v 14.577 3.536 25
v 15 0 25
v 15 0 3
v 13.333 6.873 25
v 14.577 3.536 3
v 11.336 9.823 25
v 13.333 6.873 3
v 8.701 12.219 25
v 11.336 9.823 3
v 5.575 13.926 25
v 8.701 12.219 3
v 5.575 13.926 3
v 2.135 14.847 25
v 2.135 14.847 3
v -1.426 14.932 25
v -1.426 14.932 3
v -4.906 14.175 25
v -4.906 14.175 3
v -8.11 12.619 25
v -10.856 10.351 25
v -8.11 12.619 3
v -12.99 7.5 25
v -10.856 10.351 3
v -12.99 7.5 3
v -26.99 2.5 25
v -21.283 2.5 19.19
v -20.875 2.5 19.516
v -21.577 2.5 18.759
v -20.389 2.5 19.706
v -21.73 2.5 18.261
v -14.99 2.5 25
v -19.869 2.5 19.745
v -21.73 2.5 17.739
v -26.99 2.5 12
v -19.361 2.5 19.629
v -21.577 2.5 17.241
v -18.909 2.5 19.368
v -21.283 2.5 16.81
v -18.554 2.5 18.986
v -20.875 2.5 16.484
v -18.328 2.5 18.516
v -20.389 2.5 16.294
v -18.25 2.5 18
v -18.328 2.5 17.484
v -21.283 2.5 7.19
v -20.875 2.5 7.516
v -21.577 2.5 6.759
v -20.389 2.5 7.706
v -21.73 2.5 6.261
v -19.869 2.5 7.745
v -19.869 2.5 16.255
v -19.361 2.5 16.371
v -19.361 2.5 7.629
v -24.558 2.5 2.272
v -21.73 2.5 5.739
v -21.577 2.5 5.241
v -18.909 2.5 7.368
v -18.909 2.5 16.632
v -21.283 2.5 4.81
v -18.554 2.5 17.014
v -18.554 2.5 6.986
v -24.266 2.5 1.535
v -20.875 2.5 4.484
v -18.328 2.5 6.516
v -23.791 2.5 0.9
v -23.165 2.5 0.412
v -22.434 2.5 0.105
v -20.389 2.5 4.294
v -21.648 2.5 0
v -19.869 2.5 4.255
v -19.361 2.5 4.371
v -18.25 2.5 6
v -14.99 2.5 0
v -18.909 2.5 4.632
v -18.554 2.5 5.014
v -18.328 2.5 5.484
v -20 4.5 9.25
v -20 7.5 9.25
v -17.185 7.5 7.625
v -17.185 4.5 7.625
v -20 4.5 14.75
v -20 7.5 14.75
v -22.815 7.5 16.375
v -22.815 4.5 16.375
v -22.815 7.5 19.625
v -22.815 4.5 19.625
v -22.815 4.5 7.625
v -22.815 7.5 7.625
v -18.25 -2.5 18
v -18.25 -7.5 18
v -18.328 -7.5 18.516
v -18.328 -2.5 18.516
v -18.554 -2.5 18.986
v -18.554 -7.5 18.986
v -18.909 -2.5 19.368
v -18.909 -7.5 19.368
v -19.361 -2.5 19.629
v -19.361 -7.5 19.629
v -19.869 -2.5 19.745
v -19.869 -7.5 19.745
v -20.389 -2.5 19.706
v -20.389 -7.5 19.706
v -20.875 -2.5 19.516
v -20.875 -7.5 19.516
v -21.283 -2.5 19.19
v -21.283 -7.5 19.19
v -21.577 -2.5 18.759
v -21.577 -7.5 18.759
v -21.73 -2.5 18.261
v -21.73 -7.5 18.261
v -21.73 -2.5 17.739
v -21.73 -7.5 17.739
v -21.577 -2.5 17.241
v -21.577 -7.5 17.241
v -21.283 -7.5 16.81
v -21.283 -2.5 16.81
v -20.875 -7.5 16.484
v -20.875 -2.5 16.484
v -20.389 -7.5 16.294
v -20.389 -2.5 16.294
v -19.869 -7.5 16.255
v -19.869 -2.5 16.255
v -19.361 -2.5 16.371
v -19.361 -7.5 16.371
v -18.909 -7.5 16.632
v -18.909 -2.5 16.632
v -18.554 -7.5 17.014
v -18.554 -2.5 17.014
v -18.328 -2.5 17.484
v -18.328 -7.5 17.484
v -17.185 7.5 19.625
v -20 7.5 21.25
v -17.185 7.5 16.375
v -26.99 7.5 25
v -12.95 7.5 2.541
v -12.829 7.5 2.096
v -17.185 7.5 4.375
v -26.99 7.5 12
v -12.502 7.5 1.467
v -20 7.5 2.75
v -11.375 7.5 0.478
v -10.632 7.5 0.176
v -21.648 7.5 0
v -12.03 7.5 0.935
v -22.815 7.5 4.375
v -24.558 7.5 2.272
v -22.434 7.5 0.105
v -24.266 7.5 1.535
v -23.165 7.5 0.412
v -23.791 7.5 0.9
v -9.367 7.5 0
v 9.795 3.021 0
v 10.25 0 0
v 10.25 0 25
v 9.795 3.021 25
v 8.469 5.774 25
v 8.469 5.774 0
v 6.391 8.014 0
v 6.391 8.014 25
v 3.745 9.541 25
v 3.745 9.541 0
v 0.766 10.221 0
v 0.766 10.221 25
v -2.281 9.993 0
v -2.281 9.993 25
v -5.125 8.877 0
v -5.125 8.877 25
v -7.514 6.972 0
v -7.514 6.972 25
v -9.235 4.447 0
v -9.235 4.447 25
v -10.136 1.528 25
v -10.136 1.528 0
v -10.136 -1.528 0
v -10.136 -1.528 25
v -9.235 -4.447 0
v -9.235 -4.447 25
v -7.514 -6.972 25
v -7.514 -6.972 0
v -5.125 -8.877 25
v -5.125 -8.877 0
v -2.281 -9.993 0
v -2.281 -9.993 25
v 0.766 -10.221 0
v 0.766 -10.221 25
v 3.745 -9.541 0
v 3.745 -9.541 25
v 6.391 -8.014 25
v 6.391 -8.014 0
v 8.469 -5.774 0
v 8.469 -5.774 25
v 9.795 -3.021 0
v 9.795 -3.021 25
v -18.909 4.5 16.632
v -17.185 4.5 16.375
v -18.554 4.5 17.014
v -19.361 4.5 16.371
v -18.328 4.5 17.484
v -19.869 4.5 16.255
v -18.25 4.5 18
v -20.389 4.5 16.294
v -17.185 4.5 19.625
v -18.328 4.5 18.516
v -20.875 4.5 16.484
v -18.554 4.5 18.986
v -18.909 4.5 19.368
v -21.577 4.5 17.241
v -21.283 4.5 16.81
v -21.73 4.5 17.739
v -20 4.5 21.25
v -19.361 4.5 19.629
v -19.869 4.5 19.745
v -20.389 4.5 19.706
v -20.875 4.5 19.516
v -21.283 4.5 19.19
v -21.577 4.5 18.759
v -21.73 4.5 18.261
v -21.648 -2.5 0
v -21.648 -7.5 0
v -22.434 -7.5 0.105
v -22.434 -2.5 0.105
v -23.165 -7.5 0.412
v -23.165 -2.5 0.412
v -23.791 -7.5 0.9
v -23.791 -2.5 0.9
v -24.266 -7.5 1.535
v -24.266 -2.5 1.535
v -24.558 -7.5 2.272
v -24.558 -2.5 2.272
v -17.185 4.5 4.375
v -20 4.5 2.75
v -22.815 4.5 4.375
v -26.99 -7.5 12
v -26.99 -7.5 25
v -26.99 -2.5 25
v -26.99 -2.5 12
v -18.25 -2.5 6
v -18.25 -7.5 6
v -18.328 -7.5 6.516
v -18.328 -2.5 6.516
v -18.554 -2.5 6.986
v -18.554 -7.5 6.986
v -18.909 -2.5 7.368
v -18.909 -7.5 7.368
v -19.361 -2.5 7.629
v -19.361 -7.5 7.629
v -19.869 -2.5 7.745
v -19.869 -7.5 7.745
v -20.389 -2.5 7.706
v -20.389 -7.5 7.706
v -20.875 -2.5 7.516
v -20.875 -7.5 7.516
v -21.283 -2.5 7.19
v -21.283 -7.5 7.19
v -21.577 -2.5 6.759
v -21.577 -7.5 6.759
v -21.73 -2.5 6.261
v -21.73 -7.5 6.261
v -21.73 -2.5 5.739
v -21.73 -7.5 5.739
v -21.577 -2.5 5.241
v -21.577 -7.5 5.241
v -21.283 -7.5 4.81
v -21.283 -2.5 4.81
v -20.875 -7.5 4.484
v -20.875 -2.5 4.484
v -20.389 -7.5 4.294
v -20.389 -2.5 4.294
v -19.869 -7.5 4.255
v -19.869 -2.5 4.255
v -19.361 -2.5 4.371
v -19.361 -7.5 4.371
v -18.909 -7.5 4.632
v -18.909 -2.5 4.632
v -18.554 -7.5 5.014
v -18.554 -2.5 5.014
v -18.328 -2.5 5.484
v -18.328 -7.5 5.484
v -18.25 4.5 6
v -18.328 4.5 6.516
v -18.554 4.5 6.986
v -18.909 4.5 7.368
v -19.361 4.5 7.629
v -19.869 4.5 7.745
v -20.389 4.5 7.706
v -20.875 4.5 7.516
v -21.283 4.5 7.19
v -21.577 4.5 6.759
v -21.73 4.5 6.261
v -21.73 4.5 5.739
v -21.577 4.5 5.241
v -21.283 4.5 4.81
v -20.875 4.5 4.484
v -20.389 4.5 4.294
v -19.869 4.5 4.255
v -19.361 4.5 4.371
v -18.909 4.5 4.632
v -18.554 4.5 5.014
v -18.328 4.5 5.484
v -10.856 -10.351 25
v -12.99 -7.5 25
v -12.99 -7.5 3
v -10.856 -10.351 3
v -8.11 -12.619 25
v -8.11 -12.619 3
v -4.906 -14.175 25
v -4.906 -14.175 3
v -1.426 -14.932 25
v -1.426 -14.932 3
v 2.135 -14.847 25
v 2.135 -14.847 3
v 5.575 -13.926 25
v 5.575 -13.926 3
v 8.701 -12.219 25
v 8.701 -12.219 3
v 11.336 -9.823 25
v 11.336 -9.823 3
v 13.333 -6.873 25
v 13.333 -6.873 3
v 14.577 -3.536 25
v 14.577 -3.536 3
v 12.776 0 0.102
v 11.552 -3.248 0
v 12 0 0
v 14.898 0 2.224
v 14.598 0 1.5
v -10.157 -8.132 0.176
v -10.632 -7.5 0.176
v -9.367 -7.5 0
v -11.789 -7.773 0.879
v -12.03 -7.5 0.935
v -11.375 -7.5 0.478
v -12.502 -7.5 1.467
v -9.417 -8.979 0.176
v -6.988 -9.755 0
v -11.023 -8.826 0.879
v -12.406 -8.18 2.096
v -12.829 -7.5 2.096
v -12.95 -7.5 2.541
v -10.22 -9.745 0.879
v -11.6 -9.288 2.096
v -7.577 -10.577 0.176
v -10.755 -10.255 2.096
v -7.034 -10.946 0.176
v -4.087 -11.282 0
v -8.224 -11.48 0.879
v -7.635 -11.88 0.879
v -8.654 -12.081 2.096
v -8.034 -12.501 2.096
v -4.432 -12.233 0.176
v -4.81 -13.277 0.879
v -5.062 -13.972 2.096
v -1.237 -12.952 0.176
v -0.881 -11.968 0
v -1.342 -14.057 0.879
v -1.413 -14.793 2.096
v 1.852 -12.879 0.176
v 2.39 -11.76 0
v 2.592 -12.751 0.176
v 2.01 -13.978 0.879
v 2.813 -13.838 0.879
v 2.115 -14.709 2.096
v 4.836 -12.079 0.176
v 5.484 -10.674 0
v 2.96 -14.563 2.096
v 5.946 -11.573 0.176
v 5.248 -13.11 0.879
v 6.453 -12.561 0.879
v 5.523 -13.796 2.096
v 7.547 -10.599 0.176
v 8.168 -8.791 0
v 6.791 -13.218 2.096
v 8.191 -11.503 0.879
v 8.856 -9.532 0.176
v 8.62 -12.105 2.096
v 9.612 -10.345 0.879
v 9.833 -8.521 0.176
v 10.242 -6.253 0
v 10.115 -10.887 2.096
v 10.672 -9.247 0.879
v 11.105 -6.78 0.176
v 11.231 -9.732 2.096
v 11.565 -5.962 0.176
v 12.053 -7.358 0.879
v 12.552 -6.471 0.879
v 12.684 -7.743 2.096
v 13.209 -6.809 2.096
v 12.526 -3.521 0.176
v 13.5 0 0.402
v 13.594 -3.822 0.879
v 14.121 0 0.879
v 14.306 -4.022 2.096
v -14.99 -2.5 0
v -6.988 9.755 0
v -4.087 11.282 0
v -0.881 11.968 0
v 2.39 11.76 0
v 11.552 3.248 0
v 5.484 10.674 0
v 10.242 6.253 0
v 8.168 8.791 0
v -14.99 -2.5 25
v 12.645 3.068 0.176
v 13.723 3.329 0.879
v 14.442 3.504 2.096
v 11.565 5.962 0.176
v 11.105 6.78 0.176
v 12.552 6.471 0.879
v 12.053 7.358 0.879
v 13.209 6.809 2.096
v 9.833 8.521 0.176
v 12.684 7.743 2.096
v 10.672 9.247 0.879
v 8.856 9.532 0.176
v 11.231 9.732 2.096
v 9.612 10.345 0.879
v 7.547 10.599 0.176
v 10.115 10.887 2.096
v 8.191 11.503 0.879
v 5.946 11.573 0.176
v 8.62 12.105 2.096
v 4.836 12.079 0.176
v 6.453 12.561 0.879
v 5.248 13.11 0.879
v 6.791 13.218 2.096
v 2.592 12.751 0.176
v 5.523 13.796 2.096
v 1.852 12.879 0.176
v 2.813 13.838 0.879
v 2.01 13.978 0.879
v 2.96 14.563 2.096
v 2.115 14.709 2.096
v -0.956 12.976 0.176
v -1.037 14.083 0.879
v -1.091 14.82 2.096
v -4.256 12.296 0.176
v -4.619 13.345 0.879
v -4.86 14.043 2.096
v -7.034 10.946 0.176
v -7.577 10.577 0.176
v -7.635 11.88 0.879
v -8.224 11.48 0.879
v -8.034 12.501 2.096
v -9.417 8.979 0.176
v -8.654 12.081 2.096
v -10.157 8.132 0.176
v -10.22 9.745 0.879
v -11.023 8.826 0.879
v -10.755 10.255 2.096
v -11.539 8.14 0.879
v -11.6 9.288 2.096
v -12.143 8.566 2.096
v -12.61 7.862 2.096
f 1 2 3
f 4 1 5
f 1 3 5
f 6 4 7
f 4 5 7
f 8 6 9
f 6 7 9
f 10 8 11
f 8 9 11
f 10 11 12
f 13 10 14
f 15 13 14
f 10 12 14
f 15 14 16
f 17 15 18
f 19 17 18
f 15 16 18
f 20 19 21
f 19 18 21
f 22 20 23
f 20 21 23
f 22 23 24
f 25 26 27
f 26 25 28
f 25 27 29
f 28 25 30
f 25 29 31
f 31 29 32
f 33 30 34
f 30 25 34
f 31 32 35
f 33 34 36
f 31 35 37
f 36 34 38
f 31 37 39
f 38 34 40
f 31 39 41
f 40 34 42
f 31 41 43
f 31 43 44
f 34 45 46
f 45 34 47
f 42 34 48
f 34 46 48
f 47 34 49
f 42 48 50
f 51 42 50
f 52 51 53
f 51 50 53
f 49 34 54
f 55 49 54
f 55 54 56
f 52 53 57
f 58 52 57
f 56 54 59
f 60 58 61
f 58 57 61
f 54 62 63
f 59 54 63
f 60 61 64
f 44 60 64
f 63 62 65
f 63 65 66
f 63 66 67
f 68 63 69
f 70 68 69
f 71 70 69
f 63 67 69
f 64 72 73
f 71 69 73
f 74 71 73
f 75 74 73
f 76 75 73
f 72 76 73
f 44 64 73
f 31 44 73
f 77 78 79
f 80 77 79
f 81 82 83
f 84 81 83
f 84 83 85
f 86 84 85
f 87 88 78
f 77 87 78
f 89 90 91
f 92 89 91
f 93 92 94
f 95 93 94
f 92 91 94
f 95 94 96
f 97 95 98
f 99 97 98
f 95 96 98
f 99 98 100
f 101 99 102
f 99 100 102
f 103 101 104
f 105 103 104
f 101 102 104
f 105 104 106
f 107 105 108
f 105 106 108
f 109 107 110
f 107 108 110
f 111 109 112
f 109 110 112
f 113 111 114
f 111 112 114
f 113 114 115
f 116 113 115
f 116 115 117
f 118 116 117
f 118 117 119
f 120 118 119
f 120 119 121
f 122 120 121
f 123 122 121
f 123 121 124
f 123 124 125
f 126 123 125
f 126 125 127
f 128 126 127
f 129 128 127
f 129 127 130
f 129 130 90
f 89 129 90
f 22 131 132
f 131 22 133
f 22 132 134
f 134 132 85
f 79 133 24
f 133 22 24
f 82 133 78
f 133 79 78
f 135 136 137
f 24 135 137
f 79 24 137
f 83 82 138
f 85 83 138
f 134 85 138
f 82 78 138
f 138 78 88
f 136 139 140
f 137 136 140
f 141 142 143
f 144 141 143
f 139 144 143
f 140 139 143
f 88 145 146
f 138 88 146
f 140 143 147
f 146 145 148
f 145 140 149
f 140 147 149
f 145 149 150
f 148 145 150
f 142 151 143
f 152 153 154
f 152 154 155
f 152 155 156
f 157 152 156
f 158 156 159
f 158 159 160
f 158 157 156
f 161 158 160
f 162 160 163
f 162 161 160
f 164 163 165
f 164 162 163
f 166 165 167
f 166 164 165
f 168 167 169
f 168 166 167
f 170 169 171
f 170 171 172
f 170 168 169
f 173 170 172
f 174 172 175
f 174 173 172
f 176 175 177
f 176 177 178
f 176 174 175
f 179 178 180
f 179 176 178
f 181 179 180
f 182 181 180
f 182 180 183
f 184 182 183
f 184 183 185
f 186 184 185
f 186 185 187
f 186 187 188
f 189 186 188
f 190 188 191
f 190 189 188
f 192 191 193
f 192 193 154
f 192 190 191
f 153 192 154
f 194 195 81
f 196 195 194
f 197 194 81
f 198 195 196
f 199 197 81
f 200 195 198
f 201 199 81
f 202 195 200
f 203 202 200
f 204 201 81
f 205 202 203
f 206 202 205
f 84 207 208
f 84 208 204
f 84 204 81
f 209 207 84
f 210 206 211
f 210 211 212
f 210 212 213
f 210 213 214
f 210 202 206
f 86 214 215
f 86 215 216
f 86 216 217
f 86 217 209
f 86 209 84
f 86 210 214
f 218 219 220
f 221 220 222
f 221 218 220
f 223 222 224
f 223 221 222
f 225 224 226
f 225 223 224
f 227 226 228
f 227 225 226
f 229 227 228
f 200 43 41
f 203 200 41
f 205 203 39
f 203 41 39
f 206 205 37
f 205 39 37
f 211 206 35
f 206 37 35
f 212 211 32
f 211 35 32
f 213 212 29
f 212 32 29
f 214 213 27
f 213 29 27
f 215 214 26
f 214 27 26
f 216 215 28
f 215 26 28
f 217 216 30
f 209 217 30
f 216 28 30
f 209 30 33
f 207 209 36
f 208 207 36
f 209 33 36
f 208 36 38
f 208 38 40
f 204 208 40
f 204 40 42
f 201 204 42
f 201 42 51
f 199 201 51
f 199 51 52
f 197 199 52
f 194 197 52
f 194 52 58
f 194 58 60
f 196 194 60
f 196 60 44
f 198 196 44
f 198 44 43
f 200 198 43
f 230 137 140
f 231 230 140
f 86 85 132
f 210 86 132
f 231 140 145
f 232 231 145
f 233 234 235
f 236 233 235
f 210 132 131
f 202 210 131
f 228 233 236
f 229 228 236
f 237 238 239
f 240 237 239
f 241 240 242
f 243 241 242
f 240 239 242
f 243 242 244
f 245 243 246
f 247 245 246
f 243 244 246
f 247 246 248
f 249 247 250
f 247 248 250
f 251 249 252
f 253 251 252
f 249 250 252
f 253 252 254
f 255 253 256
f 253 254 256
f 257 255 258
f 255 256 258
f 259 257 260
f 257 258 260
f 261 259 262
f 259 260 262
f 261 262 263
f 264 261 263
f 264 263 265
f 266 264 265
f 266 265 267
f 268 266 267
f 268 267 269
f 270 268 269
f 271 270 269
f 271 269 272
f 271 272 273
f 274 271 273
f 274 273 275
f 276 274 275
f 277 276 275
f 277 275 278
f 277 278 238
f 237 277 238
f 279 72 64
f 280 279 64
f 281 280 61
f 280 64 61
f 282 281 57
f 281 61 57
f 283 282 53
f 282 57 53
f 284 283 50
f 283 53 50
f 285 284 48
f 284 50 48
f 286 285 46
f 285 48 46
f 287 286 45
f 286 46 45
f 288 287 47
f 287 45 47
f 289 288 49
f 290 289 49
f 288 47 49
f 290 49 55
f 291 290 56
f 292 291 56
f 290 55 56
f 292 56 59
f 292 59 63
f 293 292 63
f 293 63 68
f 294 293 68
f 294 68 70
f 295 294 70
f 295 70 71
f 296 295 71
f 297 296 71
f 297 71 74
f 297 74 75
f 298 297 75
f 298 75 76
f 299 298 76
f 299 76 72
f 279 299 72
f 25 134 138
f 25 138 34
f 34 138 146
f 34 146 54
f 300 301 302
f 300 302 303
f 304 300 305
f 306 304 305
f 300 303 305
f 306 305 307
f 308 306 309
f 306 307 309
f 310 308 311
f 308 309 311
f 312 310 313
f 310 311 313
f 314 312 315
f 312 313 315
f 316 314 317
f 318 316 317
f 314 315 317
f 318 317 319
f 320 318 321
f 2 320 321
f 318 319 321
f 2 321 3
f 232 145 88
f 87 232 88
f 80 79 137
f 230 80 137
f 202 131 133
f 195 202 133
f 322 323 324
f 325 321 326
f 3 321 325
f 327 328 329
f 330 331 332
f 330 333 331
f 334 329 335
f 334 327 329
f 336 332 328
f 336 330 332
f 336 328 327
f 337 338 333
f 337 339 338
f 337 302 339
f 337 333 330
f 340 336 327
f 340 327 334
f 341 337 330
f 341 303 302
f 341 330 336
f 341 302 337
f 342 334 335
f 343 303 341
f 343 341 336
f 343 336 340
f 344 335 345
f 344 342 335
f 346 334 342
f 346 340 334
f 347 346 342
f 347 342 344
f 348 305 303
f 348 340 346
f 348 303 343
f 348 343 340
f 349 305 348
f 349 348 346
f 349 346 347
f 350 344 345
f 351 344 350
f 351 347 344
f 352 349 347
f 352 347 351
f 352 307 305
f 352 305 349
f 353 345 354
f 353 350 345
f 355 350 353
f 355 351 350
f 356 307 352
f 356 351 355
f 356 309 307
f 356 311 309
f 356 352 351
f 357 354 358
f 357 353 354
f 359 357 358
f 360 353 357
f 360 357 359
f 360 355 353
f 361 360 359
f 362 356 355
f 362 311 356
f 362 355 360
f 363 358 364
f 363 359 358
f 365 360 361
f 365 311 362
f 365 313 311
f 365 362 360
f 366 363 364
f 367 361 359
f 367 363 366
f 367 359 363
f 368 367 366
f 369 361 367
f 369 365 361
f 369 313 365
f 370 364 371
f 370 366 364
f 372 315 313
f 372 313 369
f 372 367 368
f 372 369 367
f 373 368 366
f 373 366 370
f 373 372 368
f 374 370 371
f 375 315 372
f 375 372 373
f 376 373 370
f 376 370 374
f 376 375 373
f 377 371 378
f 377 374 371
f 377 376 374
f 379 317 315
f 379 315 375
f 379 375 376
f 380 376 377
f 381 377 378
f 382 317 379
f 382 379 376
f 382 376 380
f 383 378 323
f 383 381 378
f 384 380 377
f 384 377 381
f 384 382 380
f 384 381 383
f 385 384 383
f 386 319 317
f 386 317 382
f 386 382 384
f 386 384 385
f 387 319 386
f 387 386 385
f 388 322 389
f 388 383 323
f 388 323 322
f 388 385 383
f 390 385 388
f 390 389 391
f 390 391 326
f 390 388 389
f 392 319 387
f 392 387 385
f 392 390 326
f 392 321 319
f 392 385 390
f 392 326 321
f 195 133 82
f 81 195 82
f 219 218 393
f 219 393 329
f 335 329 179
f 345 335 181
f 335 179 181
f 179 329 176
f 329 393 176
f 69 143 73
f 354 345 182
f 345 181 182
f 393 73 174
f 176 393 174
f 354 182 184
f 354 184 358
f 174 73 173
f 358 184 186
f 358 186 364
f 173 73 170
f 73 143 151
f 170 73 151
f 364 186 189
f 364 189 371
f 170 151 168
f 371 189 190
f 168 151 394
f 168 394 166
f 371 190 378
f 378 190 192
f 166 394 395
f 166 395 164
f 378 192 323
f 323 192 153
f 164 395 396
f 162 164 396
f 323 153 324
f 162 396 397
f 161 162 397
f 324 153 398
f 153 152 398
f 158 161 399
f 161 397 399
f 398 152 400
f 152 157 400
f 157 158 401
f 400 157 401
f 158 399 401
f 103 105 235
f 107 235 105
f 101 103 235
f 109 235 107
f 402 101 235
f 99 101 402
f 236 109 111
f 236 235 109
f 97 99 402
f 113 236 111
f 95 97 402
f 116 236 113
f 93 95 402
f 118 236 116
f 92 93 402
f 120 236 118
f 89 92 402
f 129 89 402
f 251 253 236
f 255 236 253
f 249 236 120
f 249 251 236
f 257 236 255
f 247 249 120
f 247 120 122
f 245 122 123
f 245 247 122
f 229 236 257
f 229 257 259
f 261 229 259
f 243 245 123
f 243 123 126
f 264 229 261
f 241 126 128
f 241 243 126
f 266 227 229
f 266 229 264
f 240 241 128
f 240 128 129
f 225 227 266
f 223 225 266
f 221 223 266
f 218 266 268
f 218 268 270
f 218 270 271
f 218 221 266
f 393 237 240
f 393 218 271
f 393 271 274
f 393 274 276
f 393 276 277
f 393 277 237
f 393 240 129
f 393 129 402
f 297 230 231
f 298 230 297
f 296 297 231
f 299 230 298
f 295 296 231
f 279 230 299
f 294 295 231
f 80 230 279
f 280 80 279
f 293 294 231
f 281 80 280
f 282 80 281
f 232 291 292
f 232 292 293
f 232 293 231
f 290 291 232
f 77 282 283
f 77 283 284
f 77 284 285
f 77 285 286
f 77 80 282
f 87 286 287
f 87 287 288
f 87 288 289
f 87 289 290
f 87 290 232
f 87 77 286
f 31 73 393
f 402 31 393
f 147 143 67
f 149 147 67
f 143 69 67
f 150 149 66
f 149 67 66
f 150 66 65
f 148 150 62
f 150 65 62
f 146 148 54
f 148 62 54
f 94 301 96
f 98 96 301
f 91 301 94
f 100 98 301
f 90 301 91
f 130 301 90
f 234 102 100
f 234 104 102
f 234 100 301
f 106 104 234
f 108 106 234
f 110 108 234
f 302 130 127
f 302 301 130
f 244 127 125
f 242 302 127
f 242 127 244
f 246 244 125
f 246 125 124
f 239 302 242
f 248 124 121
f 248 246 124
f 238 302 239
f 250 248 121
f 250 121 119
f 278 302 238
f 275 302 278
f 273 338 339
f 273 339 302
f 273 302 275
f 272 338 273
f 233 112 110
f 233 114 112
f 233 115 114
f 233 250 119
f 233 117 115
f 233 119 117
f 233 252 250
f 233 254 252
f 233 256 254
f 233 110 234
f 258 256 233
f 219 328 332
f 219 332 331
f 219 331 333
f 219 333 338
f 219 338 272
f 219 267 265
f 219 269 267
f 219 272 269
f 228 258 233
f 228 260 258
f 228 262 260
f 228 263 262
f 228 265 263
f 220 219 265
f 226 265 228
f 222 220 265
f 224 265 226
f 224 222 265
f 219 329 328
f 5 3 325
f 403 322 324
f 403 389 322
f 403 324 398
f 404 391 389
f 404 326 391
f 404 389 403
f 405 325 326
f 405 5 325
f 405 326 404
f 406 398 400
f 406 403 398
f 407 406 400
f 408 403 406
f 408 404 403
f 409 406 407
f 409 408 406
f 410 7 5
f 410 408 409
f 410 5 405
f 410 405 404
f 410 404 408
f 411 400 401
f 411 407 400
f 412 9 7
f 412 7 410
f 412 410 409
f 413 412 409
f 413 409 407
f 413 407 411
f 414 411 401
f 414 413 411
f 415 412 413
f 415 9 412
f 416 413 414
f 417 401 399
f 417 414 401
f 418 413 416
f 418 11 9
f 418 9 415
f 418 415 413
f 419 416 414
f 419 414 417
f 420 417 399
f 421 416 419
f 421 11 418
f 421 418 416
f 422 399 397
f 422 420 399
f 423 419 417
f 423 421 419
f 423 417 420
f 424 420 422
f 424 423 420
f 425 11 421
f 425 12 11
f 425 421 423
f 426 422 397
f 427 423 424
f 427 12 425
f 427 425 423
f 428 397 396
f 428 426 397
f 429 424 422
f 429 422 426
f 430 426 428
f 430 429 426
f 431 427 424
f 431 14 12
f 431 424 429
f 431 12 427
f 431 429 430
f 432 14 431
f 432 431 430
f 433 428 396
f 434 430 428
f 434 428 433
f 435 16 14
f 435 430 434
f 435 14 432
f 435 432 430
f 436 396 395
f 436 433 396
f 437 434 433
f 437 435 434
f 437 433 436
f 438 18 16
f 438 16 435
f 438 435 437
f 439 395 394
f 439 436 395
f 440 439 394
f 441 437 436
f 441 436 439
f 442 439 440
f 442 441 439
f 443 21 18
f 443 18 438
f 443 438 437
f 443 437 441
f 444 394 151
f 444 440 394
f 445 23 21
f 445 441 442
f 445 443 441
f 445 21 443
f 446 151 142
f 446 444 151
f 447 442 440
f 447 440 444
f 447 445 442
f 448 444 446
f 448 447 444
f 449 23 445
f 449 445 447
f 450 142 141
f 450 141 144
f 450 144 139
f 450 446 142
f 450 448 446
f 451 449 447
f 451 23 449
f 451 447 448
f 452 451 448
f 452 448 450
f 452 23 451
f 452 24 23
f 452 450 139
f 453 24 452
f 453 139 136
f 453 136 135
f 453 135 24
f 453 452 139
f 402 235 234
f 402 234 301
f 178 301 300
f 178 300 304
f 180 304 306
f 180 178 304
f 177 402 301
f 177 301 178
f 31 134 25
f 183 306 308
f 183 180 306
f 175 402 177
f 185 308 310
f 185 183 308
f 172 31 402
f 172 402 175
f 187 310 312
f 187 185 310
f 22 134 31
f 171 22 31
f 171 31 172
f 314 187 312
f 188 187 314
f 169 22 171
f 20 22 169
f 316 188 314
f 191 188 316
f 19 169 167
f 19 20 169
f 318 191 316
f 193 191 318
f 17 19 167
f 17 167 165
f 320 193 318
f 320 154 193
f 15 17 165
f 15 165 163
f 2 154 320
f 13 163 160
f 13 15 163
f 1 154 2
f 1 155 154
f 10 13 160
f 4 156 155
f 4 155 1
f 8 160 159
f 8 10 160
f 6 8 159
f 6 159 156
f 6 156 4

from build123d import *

# Parameters (mm, degrees)
SKETCH_R        = 10.25
PAD_DEPTH       = 25
SKETCH001_R     = 1.75
POCKET_DEPTH    = 22.501
POCKET001_DEPTH = 3
CHAMFER_SIZE2   = 12
CHAMFER_SIZE    = 3
FILLET_R        = 3
FILLET001_R     = 3


with BuildPart() as part:
    # Sketch → Pad (new body)
    with BuildSketch(Plane.XY):
        with BuildLine():
            ThreePointArc((15, 0), (3.882286, 14.488887), (-12.990381, 7.5))
            Line((-12.990381, 7.5), (-26.990381, 7.5))
            Line((-26.990381, 7.5), (-26.990381, 2.5))
            Line((-26.990381, 2.5), (-14.990381, 2.5))
            Line((-14.990381, 2.5), (-14.990381, -2.5))
            Line((-26.990381, -2.5), (-14.990381, -2.5))
            Line((-26.990381, -7.5), (-26.990381, -2.5))
            Line((-12.990381, -7.5), (-26.990381, -7.5))
            ThreePointArc((-12.990381, -7.5), (3.882286, -14.488887), (15, 0))
        make_face()
        Circle(SKETCH_R, mode=Mode.SUBTRACT)
    extrude(amount=PAD_DEPTH)

    # Sketch001 (on Face8 of Pad) → Pocket (cut, through all)
    with BuildSketch(Plane.XZ.offset(7.5)):
        with Locations((-20, 6)):
            Circle(SKETCH001_R)
        with Locations((-20, 18)):
            Circle(SKETCH001_R)
    extrude(amount=-POCKET_DEPTH, mode=Mode.SUBTRACT)

    # Sketch002 (on Face3 of Pocket) → Pocket001 (cut)
    with BuildSketch(Plane(origin=(0, 7.5, 0), x_dir=(-1, 0, 0), z_dir=(0, 1, 0))):
        Polygon((20, 2.75), (22.814583, 4.375), (22.814583, 7.625), (20, 9.25), (17.185417, 7.625), (17.185417, 4.375), align=None)
        Polygon((20, 14.75), (22.814583, 16.375), (22.814583, 19.625), (20, 21.25), (17.185417, 19.625), (17.185417, 16.375), align=None)
    extrude(amount=-POCKET001_DEPTH, mode=Mode.SUBTRACT)

    # Chamfer
    chamfer_edges = [part.edges().sort_by_distance(p)[0] for p in [
        (-26.990381, 5, 0),
        (-26.990381, -5, 0),
    ]]
    chamfer_side = part.faces().sort_by_distance((3.748719, 13.990411, 0))[0]
    chamfer(chamfer_edges, length=CHAMFER_SIZE, length2=CHAMFER_SIZE2, reference=chamfer_side)

    # Fillet
    fillet_edges = [part.edges().sort_by_distance(p)[0] for p in [
        (-23.990381, 5, 0),
        (-23.990381, -5, 0),
    ]]
    fillet(fillet_edges, radius=FILLET_R)

    # Fillet001
    fillet001_edges = [part.edges().sort_by_distance(p)[0] for p in [
        (3.882286, -14.488887, 0),
        (3.882286, 14.488887, 0),
    ]]
    fillet(fillet001_edges, radius=FILLET001_R)


solid = part.part
